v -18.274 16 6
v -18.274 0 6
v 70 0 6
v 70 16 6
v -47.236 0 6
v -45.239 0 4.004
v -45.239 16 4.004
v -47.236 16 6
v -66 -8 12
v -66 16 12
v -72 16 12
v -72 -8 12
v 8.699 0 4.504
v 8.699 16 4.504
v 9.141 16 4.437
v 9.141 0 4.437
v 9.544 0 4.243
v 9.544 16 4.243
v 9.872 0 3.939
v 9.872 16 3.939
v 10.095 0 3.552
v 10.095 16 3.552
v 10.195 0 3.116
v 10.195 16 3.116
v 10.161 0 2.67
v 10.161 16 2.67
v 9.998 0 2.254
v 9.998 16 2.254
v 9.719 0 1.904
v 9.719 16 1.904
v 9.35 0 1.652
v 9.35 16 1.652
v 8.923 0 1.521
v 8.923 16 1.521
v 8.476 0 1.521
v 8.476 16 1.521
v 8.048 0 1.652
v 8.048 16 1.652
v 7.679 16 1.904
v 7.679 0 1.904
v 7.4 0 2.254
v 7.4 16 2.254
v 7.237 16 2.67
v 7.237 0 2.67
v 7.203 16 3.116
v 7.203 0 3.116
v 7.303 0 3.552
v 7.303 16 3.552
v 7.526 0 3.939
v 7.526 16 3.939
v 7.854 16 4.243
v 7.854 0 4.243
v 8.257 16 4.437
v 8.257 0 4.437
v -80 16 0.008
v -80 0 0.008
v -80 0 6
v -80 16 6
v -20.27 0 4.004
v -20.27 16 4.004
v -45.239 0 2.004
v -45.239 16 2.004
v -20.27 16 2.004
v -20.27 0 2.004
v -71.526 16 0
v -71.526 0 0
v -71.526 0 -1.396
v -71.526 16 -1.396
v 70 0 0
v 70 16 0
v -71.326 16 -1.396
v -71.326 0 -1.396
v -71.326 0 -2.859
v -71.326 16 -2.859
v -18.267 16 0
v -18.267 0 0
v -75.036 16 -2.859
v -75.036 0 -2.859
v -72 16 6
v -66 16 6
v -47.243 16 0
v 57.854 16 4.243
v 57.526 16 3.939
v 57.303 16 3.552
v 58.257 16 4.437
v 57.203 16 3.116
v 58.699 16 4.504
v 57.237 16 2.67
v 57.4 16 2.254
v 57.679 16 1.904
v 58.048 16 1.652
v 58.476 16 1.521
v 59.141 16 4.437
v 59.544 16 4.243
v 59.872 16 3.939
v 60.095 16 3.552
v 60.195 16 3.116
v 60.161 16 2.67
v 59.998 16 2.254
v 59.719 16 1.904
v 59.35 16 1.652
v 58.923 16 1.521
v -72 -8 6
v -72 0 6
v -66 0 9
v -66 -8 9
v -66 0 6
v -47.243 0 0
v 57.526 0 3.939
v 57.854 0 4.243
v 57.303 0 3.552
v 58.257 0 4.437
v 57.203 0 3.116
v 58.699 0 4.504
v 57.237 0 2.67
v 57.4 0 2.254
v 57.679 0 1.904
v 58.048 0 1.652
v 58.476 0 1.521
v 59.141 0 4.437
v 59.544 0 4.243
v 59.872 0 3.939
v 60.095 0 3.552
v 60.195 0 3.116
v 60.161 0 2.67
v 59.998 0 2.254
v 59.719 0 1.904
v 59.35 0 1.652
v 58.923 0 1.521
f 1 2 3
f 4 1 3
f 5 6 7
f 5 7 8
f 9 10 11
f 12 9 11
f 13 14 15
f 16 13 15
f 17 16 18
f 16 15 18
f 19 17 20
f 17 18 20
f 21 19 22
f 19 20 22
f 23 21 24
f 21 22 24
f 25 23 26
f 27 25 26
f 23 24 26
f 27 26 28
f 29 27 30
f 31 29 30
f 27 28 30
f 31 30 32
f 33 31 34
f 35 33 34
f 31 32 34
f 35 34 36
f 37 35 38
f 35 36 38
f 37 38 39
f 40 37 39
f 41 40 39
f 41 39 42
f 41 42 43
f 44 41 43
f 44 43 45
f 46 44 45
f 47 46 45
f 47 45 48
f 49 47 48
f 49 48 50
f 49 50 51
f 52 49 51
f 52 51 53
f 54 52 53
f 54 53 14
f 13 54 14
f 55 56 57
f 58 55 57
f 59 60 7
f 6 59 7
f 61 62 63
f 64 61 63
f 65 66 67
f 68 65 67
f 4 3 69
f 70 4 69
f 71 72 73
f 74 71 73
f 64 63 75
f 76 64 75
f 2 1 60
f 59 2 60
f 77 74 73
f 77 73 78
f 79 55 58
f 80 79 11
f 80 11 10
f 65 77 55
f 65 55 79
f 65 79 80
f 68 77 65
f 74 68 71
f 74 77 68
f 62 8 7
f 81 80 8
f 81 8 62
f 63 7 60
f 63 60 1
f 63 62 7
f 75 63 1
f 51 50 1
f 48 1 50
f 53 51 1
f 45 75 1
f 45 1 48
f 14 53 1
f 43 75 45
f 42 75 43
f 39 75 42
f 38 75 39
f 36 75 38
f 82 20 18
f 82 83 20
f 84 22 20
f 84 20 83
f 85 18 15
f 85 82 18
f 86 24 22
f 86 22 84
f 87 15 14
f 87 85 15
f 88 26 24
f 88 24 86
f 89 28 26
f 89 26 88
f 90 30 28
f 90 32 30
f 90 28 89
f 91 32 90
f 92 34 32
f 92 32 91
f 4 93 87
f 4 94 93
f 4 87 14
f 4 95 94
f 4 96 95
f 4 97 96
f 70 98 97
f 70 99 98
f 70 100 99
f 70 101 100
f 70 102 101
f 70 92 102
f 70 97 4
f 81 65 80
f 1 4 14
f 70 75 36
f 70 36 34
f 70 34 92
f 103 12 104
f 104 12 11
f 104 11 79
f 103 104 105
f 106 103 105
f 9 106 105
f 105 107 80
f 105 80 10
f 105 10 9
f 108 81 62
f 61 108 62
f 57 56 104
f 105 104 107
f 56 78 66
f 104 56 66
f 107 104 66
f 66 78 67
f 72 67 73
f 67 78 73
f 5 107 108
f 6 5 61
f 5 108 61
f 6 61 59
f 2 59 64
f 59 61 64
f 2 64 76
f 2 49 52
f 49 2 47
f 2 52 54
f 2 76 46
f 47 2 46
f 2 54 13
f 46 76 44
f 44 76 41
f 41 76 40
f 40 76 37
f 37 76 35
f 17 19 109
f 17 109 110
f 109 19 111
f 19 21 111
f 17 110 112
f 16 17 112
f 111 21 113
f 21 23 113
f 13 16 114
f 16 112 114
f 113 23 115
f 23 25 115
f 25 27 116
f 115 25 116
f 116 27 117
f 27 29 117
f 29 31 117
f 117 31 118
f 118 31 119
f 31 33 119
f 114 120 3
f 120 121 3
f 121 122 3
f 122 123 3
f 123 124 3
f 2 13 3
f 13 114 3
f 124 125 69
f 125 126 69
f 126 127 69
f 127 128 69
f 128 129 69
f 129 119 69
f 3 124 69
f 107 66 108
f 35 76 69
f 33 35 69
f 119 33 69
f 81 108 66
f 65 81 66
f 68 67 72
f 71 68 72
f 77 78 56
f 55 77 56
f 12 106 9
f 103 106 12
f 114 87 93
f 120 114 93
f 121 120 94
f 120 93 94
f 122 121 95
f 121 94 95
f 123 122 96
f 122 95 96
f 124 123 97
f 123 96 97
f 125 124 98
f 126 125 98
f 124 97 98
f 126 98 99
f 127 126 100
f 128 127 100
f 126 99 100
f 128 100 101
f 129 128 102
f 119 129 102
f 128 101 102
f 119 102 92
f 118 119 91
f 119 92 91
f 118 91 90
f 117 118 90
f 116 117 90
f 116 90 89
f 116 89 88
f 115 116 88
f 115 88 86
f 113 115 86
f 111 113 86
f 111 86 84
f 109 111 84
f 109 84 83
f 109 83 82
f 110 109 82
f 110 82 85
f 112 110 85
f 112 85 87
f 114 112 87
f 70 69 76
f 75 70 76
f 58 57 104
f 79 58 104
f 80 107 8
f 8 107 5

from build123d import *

# Parameters (mm, degrees)
EXTRUDE_1_DEPTH     = 16
SKETCH_3_R          = 1.5
CUT_EXTRUDE_1_DEPTH = 82.804645345
SKETCH_4_W          = 6
SKETCH_4_H          = 6
EXTRUDE_2_DEPTH     = 16
EXTRUDE_START       = -16
EXTRUDE_4_DEPTH     = 8


with BuildPart() as part:
    # Эскиз1 → Бобышка-Вытянуть1 (new body)
    with BuildSketch(Plane(origin=(0, 0, 0), x_dir=(1, 0, 0), z_dir=(0, 1, 0))):
        Polygon((0, 0), (-71.525936721, 0), (-71.525936721, 1.396480231), (-71.325936721, 1.396480231), (-71.325936721, 2.8586364), (-75.035652424, 2.8586364), (-80, -0.007531009), (-80, -6), (70, -6), (70, 0), align=None)
    extrude(amount=EXTRUDE_1_DEPTH)

    # Эскиз3 → Вырез-Вытянуть1 (cut, through all)
    with BuildSketch(Plane(origin=(0, 16, 0), x_dir=(1, 0, 0), z_dir=(0, 1, 0))):
        with Locations(Location((8.699103215, -3.003765504, 0), (0, 0, 270))):
            Circle(SKETCH_3_R)
        with Locations(Location((58.699103215, -3.003765504, 0), (0, 0, 270))):
            Circle(SKETCH_3_R)
        Polygon((-47.243192472, 0), (-45.239426968, -2.003765504), (-20.270391363, -2.003765504), (-18.266625858, 0), align=None)
        Polygon((-47.243192472, -6.007531009), (-18.266625858, -6.007531009), (-20.270391363, -4.003765504), (-45.239426968, -4.003765504), align=None)
    extrude(amount=-CUT_EXTRUDE_1_DEPTH, mode=Mode.SUBTRACT)

    # Эскиз4 → Бобышка-Вытянуть2 (add)
    with BuildSketch(Plane.XZ):
        with Locations((-69, 9)):
            Rectangle(SKETCH_4_W, SKETCH_4_H)
    extrude(amount=-EXTRUDE_2_DEPTH)

    # Эскиз5<2> → Бобышка-Вытянуть4 (add)
    with BuildSketch(Plane(origin=(0, 16, 0), x_dir=(1, 0, 0), z_dir=(0, 1, 0)).offset(EXTRUDE_START)):
        Polygon((-72, -12), (-72, -6), (-66, -9), (-66, -12), align=None)
    extrude(amount=-EXTRUDE_4_DEPTH)


solid = part.part
